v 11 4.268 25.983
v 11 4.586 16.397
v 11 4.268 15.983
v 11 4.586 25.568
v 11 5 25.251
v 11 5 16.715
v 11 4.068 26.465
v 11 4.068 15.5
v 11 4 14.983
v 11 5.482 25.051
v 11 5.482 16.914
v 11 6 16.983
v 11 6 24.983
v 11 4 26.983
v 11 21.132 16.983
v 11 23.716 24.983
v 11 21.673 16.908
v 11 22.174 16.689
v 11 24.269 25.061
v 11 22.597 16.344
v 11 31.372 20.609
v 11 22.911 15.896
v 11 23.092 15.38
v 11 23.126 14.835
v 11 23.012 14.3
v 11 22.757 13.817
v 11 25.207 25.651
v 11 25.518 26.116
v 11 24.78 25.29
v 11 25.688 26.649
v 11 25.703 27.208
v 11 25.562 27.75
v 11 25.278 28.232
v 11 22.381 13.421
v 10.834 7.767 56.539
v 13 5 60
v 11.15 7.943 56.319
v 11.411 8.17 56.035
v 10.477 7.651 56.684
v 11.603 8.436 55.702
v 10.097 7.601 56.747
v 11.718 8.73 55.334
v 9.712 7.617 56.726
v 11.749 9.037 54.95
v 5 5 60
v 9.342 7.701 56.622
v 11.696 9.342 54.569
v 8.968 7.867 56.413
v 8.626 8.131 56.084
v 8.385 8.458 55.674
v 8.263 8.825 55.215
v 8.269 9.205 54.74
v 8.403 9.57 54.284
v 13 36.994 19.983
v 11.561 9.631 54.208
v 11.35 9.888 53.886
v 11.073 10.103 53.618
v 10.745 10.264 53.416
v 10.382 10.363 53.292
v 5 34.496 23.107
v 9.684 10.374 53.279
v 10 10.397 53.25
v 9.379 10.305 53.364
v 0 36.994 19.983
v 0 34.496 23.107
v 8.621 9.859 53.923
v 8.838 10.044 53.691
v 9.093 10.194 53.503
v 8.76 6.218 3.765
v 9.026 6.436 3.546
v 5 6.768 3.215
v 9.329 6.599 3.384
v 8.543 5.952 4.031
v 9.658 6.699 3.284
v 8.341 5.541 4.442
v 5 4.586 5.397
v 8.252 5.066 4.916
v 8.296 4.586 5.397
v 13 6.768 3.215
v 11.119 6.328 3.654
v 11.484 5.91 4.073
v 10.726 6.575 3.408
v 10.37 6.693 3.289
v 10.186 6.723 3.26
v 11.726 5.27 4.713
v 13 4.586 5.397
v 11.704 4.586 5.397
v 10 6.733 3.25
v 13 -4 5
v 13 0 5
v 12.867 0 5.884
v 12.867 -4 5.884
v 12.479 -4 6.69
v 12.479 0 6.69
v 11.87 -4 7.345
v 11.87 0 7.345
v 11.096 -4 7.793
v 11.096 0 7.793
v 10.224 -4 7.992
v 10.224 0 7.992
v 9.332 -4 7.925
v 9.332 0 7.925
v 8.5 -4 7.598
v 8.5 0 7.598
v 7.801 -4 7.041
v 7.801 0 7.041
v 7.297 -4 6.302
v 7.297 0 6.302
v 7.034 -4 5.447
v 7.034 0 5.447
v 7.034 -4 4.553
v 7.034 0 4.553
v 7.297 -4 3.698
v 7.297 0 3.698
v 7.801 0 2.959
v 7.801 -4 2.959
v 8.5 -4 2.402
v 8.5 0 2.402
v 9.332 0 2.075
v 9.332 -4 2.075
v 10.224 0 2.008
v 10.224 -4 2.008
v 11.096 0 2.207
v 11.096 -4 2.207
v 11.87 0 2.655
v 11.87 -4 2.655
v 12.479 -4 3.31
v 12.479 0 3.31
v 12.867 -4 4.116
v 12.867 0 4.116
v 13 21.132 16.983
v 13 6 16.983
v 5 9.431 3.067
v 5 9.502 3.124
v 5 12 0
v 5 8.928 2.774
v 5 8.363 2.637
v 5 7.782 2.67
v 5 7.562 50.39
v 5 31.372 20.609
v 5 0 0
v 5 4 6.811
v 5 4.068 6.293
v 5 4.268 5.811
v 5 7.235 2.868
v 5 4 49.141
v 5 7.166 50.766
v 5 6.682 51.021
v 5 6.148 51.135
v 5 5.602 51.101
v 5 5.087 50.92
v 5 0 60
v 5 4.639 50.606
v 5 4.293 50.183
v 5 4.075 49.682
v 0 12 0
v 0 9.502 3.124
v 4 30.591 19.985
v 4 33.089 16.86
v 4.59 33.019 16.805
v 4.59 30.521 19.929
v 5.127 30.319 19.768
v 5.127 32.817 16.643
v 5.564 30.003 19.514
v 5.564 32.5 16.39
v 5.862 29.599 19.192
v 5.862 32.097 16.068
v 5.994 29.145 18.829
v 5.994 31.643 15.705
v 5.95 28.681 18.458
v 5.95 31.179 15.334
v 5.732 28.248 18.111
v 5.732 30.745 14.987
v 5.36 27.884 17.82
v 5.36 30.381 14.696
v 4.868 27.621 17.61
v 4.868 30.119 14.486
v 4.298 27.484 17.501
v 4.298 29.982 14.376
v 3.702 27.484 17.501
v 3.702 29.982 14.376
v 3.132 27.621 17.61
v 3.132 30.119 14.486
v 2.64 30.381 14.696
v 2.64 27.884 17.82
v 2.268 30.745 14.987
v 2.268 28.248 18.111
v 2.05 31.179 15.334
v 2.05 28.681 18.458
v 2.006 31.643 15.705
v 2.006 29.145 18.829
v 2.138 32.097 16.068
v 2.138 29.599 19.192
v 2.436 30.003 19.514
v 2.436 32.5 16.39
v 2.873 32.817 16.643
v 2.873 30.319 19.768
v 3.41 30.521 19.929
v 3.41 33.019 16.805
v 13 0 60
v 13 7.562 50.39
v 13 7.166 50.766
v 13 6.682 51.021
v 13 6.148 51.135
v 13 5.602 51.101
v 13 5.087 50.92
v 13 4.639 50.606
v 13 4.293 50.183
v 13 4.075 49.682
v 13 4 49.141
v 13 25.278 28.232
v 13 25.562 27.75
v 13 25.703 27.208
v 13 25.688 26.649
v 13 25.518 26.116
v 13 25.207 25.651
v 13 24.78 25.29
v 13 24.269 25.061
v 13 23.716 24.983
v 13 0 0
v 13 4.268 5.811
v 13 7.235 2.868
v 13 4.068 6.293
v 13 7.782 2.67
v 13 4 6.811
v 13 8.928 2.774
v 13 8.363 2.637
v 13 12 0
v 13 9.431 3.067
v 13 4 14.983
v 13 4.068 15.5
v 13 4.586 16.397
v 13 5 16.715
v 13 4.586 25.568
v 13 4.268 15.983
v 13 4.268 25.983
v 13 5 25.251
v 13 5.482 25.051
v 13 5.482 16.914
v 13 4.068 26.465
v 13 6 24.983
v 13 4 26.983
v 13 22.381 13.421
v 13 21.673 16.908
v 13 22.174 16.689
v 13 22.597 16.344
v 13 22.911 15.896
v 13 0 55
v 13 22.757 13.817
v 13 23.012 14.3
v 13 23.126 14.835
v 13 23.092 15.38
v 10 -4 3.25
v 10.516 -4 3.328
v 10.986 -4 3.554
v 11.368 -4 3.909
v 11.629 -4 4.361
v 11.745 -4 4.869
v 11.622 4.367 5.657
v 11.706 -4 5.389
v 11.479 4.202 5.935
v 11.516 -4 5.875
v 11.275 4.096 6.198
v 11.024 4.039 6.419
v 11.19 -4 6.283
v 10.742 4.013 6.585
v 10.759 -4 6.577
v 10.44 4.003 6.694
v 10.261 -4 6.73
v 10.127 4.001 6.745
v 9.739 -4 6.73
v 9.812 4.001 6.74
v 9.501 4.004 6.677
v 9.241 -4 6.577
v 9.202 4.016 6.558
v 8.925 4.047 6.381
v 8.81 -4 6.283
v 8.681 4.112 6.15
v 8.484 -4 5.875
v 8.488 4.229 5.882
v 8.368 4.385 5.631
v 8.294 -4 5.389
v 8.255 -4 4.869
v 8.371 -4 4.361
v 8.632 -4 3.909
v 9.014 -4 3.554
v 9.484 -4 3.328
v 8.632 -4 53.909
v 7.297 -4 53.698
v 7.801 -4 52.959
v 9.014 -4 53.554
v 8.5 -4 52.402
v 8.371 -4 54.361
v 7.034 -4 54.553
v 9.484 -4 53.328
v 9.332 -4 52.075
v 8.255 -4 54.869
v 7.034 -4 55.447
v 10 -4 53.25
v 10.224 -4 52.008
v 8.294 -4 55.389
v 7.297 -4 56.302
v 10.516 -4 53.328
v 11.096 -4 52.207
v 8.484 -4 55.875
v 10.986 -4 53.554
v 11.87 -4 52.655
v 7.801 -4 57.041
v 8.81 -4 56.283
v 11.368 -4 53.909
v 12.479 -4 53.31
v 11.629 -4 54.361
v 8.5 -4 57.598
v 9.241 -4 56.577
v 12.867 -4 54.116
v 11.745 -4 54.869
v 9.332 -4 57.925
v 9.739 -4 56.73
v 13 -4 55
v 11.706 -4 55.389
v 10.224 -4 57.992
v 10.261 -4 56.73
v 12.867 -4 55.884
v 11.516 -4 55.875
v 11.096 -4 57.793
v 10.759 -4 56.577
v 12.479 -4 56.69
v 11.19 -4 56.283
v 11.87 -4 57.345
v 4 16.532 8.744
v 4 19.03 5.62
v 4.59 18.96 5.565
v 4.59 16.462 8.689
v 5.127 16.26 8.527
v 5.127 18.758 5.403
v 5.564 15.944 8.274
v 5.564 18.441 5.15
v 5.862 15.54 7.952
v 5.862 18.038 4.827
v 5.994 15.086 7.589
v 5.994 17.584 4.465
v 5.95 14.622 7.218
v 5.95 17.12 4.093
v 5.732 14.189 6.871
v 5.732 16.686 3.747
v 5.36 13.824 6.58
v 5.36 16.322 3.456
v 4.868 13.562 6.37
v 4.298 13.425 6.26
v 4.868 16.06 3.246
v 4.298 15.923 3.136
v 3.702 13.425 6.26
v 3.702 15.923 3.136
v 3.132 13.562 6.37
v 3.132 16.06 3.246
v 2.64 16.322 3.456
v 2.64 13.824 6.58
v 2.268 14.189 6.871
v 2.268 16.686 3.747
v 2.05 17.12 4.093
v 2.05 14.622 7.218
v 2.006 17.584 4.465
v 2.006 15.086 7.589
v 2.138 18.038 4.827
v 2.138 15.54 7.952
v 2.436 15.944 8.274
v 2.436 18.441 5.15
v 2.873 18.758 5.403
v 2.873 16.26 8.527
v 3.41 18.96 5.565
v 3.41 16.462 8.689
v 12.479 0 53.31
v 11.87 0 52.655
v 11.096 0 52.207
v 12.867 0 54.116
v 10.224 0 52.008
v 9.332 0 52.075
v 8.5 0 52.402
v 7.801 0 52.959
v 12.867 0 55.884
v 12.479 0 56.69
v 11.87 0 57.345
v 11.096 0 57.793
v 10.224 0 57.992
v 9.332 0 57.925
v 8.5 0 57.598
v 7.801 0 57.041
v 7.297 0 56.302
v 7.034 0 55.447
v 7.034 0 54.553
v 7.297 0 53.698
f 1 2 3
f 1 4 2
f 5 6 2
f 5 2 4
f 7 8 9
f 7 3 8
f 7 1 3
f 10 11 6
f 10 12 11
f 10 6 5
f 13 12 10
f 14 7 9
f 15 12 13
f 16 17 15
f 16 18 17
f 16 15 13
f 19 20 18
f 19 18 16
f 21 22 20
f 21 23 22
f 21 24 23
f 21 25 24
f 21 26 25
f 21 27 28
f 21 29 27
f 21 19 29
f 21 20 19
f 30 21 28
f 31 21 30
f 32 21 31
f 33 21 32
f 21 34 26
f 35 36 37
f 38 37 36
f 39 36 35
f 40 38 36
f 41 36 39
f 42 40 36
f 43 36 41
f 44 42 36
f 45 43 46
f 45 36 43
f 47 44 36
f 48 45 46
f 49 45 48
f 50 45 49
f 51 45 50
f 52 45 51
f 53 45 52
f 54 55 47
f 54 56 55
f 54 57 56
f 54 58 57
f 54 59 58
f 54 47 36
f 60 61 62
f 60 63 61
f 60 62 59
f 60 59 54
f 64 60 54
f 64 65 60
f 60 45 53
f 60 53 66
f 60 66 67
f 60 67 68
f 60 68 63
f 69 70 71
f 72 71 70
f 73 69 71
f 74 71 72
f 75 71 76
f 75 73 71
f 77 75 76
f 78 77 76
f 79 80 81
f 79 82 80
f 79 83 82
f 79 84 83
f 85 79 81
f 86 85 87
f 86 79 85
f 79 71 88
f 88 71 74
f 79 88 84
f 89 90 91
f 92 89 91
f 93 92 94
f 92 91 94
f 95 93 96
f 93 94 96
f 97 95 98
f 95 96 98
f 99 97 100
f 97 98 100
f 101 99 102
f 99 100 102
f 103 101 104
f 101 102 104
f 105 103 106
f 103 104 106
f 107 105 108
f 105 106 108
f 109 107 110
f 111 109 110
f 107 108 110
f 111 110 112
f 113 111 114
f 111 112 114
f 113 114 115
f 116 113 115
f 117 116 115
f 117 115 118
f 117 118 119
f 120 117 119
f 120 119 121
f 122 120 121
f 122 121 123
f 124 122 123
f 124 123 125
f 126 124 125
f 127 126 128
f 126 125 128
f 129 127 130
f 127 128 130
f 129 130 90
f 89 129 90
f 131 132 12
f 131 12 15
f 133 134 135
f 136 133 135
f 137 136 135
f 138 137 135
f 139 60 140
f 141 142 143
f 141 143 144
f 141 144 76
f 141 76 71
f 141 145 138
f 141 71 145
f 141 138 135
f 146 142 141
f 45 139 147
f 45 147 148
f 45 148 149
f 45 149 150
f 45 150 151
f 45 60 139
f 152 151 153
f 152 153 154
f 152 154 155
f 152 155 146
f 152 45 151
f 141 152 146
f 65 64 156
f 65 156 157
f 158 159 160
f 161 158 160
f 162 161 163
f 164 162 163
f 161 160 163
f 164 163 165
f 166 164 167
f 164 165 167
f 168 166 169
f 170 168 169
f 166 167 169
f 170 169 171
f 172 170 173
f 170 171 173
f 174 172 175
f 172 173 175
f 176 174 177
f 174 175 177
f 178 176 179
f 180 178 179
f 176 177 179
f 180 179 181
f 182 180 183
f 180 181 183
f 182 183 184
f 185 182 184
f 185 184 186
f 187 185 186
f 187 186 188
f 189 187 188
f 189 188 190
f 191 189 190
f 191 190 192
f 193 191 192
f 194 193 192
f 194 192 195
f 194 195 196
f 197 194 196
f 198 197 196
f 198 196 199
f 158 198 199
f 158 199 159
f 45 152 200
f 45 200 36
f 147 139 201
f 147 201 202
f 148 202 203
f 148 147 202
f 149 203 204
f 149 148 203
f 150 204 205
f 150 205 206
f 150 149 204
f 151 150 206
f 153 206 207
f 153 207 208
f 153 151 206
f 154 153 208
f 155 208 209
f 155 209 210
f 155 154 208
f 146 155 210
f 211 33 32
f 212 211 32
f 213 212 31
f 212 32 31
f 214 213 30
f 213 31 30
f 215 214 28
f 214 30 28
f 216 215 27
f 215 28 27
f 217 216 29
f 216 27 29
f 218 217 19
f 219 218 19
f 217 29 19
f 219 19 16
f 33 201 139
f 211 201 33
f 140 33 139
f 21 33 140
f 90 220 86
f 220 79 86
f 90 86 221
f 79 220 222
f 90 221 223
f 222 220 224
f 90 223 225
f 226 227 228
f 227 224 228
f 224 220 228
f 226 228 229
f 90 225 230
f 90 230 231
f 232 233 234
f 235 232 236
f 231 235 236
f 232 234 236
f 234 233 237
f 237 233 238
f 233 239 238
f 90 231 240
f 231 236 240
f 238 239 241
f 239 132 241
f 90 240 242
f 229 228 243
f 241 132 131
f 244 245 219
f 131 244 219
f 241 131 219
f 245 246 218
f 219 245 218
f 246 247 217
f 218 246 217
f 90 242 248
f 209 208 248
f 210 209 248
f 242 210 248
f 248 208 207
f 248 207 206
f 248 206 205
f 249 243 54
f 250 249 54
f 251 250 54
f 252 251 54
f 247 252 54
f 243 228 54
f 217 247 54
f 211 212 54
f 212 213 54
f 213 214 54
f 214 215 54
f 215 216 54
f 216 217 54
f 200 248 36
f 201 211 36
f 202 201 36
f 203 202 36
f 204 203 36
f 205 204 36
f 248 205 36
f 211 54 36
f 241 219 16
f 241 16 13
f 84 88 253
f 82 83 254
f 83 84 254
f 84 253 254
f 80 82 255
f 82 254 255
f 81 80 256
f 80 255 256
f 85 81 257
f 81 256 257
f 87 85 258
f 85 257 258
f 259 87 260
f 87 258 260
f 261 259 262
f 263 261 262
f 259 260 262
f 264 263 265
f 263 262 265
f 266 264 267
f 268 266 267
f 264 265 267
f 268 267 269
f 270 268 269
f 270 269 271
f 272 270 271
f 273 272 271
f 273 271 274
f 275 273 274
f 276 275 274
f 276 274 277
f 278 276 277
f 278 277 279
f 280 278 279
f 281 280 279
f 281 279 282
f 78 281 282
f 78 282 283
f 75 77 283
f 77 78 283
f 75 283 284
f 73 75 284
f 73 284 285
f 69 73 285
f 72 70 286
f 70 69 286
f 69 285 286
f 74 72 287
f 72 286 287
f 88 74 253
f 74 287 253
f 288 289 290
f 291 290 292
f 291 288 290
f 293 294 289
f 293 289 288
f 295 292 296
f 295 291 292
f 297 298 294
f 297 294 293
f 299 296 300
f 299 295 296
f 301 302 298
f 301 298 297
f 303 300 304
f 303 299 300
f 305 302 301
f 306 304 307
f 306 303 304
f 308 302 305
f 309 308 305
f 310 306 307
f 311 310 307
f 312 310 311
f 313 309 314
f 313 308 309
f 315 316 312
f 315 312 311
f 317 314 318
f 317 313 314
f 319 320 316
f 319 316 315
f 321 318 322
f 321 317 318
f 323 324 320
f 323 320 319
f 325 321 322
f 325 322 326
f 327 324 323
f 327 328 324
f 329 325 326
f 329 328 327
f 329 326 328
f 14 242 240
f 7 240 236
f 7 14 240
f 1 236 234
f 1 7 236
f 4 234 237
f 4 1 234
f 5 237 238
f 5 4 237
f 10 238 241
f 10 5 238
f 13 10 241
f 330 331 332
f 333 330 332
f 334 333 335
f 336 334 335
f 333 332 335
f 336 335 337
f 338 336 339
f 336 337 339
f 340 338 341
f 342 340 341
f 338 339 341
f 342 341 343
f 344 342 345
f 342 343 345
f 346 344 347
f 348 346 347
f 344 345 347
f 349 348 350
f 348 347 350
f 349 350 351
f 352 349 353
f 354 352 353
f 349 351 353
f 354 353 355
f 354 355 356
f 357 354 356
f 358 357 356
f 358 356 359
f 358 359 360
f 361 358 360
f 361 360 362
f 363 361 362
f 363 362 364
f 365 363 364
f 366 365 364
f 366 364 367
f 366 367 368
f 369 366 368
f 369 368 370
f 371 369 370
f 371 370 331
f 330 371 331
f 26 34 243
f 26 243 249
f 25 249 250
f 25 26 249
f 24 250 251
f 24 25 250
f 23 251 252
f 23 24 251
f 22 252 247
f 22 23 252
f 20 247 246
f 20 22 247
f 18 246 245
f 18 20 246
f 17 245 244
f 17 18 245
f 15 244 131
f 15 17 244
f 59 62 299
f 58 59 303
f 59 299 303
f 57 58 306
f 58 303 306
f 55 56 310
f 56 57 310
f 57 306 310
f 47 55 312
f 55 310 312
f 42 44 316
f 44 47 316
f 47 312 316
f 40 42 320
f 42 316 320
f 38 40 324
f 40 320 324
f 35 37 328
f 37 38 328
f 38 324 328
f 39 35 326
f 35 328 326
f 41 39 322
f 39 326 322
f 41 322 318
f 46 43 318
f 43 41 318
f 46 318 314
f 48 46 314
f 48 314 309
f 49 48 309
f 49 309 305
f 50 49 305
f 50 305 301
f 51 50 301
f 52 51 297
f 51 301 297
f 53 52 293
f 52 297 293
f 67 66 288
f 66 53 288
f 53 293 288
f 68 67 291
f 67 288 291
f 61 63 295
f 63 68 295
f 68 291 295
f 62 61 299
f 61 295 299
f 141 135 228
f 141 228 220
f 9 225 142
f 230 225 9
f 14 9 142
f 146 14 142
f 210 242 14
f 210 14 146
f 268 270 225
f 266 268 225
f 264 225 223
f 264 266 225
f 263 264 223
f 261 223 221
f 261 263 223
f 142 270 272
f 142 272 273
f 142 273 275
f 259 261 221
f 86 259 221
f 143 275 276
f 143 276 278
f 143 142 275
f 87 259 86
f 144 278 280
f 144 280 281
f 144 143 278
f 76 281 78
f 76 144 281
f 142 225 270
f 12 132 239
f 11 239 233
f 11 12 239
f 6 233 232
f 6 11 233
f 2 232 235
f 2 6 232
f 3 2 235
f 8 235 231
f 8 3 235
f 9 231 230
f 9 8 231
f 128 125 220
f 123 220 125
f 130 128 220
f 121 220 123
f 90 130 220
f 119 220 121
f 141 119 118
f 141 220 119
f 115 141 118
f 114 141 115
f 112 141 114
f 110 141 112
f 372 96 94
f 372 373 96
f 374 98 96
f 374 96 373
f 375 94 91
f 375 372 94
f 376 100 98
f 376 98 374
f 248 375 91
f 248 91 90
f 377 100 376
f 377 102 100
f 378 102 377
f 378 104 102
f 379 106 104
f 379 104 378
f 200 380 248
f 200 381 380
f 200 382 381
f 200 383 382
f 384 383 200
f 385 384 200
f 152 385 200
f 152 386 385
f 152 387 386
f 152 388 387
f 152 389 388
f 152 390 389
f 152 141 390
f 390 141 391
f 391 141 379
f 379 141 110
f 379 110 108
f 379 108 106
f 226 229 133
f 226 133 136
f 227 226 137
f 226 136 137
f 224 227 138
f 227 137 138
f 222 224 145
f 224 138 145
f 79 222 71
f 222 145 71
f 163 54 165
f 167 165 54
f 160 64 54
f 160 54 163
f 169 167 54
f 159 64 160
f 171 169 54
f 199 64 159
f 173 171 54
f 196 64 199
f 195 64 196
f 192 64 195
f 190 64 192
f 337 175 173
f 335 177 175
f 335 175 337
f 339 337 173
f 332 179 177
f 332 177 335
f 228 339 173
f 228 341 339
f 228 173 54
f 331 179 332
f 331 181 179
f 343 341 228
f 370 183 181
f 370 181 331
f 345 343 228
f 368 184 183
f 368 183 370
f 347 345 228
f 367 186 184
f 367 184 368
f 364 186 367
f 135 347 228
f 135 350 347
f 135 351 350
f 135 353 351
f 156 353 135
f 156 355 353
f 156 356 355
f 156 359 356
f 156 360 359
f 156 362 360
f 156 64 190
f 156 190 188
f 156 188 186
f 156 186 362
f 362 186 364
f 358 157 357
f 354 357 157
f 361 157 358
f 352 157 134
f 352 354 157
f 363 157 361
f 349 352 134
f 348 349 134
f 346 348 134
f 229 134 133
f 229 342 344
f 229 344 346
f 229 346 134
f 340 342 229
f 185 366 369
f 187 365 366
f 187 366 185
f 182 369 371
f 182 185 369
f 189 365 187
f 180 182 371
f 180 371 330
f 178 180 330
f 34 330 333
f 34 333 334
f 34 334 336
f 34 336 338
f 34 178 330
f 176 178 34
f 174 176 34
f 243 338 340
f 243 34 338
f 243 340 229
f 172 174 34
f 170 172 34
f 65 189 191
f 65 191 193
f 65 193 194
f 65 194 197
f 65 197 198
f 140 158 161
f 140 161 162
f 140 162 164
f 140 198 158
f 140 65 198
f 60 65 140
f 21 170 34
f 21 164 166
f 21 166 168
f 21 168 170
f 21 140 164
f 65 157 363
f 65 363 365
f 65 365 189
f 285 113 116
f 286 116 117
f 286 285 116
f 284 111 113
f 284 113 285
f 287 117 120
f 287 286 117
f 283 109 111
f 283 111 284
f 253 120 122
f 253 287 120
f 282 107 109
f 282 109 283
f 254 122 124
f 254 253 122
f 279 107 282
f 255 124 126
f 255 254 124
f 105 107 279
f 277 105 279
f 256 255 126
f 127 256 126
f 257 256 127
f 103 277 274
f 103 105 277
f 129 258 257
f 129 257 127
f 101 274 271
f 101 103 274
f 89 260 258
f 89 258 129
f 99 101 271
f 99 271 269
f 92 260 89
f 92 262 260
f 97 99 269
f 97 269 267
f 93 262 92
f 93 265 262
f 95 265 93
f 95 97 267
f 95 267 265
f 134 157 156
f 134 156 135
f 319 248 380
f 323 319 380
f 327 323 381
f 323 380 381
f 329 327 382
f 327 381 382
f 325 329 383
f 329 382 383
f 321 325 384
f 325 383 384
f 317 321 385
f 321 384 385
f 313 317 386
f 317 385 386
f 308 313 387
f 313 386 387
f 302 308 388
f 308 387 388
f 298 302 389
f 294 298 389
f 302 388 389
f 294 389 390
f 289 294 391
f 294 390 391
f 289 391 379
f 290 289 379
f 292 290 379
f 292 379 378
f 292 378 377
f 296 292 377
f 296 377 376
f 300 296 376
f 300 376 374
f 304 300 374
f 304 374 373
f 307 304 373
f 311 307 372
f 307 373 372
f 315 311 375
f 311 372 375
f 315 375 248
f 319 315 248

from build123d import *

# Parameters (mm, degrees)
EXTRUDE_1_DEPTH     = 13
CUT_EXTRUDE_1_DEPTH = 49.78979572841993
CUT_EXTRUDE_2_DEPTH = 72.67669327248296
FILLET_1_R          = 2
CUT_EXTRUDE_3_DEPTH = 13
SKETCH_8_R          = 2.000000000000001
SKETCH_8_R_2        = 2.0000000000000018
CUT_EXTRUDE_4_DEPTH = 13
CUT_EXTRUDE_5_DEPTH = 6
SKETCH_10_R         = 3
SKETCH_10_R_2       = 3.0000000000000013
EXTRUDE_2_DEPTH     = 4
CUT_EXTRUDE_6_REACH = 75.821
SKETCH_11_R         = 1.7500000000000004
SKETCH_11_R_2       = 1.7499999999999998


with BuildPart() as part:
    # 草圖4 → 填料-伸長1 (new body)
    with BuildSketch(Plane(origin=(0, 0, 0), x_dir=(0, 0, -1), z_dir=(1, 0, 0))):
        Polygon((0, 0), (-60, -7.35e-15), (-60, 4.999999999999993), (-19.982621227151128, 36.9938962327247), (6e-16, 12), align=None)
    extrude(amount=EXTRUDE_1_DEPTH)

    # 草圖5 → 除料-伸長1 (cut, through all)
    with BuildSketch(Plane(origin=(0, 32.31453899318016, 25.83547546241596), x_dir=(1, 0, 0), z_dir=(0, 0.7810592572726445, 0.6244569133484753))):
        Polygon((0, 3.4934829601818222), (5, 3.4934829601818222), (5.000000000000004, -49.04518650741456), (0, -49.04518650741456), align=None)
    extrude(amount=-CUT_EXTRUDE_1_DEPTH, mode=Mode.SUBTRACT)

    # 草圖6 → 除料-伸長2 (cut, through all)
    with BuildSketch(Plane(origin=(13, 0, 0), x_dir=(0, 0, -1), z_dir=(1, 0, 0))):
        Polygon((-24.98262122715113, 27.87514563803557), (-24.982621227151125, 3.9999999999999933), (-54.84521562029527, 3.99999999999999), align=None)
        Polygon((-16.982621227151128, 26.835985196390023), (-1.9496281407001657, 8.032993086450977), (-5.982621227151128, 3.9999999999999964), (-16.982621227151128, 3.9999999999999942), align=None)
    extrude(amount=-CUT_EXTRUDE_2_DEPTH, mode=Mode.SUBTRACT)

    # 圓角1
    fillet_1_edges = [part.edges().sort_by_distance(p)[0] for p in [
        (9.000000000000002, 3.99999999999999, 54.84521562029527),
        (9, 27.87514563803557, 24.98262122715113),
        (9, 3.9999999999999933, 24.982621227151125),
        (9, 26.835985196390023, 16.982621227151128),
        (9, 3.9999999999999964, 5.982621227151128),
        (9, 3.9999999999999942, 16.982621227151128),
        (9, 8.032993086450977, 1.9496281407001657),
    ]]
    fillet(fillet_1_edges, radius=FILLET_1_R)

    # 草圖7 → 除料-伸長3 (cut)
    with BuildSketch(Plane(origin=(0, 2.181529586150628, -2.728617206174244), x_dir=(1, 0, 0), z_dir=(0, -0.6244569133484752, 0.7810592572726445))):
        Polygon((0, 9.372711087271734), (4.999999999999999, 9.372711087271734), (4.999999999999999, 4.369584430641977), (0, 4.369584430641976), align=None)
    extrude(amount=-CUT_EXTRUDE_3_DEPTH, mode=Mode.SUBTRACT)

    # 草圖8 → 除料-伸長4 (cut)
    with BuildSketch(Plane(origin=(0, 4.679357239544419, -5.852854235264727), x_dir=(-1, 0, 0), z_dir=(0, 0.6244569133484724, -0.7810592572726467))):
        with Locations(Location((-4, 34.372711087271774, 0), (0, 0, 90))):
            Circle(SKETCH_8_R)
        with Locations(Location((-4, 16.372711087271757, 0), (0, 0, 90))):
            Circle(SKETCH_8_R_2)
    extrude(amount=-CUT_EXTRUDE_4_DEPTH, mode=Mode.SUBTRACT)

    # 草圖9 → 除料-伸長5 (cut)
    with BuildSketch(Plane.ZY.offset(-5)):
        with BuildLine():
            Line((20.609030602847792, 31.371831550240223), (3.0671165568141214, 9.430727107234867))
            ThreePointArc((3.0671165568141214, 9.430727107234867), (2.632312431238594, 8.07090805355147), (3.215021508986313, 6.767599718164824))
            Line((3.215021508986313, 6.767599718164824), (5.396834789524223, 4.585786437626903))
            ThreePointArc((5.396834789524223, 4.585786437626903), (6.04568148716714, 4.1522409349774225), (6.811048351897321, 3.9999999999999956))
            Line((6.811048351897321, 3.9999999999999956), (49.14086927004922, 3.9999999999999907))
            ThreePointArc((49.14086927004922, 3.9999999999999907), (51.02822681819565, 5.338273859172296), (50.38978309674617, 7.56211851454527))
            Line((50.38978309674617, 7.56211851454527), (20.609030602847792, 31.371831550240223))
        make_face()
    extrude(amount=-CUT_EXTRUDE_5_DEPTH, mode=Mode.SUBTRACT)

    # 草圖10 → 填料-伸長2 (add)
    with BuildSketch(Plane.XZ):
        with Locations((9.999999999999998, 55)):
            Circle(SKETCH_10_R)
        with Locations((9.999999999999998, 5)):
            Circle(SKETCH_10_R_2)
    extrude(amount=EXTRUDE_2_DEPTH)

    # 草圖11 → 除料-伸長6 (cut, up to next)
    with BuildSketch(Plane(origin=(0, -4, -4.9e-16), x_dir=(-1, 0, 0), z_dir=(0, -1, -1.2e-16)), mode=Mode.PRIVATE) as cut_extrude_6_sk1:
        with Locations(Location((-9.999999999999998, -55, 0), (0, 0, 90))):
            Circle(SKETCH_11_R)
    cut_extrude_6_tool1 = extrude(cut_extrude_6_sk1.sketch, amount=-CUT_EXTRUDE_6_REACH, mode=Mode.PRIVATE) & part.part
    # 草圖11 → 除料-伸長6 (cut, up to next)
    with BuildSketch(Plane(origin=(0, -4, -4.9e-16), x_dir=(-1, 0, 0), z_dir=(0, -1, -1.2e-16)), mode=Mode.PRIVATE) as cut_extrude_6_sk2:
        with Locations(Location((-9.999999999999998, -5, 0), (0, 0, 90))):
            Circle(SKETCH_11_R_2)
    cut_extrude_6_tool2 = extrude(cut_extrude_6_sk2.sketch, amount=-CUT_EXTRUDE_6_REACH, mode=Mode.PRIVATE) & part.part
    add(cut_extrude_6_tool1.solids().sort_by_distance((10, -4, 55))[0], mode=Mode.SUBTRACT)
    add(cut_extrude_6_tool2.solids().sort_by_distance((10, -4, 5))[0], mode=Mode.SUBTRACT)


solid = part.part
